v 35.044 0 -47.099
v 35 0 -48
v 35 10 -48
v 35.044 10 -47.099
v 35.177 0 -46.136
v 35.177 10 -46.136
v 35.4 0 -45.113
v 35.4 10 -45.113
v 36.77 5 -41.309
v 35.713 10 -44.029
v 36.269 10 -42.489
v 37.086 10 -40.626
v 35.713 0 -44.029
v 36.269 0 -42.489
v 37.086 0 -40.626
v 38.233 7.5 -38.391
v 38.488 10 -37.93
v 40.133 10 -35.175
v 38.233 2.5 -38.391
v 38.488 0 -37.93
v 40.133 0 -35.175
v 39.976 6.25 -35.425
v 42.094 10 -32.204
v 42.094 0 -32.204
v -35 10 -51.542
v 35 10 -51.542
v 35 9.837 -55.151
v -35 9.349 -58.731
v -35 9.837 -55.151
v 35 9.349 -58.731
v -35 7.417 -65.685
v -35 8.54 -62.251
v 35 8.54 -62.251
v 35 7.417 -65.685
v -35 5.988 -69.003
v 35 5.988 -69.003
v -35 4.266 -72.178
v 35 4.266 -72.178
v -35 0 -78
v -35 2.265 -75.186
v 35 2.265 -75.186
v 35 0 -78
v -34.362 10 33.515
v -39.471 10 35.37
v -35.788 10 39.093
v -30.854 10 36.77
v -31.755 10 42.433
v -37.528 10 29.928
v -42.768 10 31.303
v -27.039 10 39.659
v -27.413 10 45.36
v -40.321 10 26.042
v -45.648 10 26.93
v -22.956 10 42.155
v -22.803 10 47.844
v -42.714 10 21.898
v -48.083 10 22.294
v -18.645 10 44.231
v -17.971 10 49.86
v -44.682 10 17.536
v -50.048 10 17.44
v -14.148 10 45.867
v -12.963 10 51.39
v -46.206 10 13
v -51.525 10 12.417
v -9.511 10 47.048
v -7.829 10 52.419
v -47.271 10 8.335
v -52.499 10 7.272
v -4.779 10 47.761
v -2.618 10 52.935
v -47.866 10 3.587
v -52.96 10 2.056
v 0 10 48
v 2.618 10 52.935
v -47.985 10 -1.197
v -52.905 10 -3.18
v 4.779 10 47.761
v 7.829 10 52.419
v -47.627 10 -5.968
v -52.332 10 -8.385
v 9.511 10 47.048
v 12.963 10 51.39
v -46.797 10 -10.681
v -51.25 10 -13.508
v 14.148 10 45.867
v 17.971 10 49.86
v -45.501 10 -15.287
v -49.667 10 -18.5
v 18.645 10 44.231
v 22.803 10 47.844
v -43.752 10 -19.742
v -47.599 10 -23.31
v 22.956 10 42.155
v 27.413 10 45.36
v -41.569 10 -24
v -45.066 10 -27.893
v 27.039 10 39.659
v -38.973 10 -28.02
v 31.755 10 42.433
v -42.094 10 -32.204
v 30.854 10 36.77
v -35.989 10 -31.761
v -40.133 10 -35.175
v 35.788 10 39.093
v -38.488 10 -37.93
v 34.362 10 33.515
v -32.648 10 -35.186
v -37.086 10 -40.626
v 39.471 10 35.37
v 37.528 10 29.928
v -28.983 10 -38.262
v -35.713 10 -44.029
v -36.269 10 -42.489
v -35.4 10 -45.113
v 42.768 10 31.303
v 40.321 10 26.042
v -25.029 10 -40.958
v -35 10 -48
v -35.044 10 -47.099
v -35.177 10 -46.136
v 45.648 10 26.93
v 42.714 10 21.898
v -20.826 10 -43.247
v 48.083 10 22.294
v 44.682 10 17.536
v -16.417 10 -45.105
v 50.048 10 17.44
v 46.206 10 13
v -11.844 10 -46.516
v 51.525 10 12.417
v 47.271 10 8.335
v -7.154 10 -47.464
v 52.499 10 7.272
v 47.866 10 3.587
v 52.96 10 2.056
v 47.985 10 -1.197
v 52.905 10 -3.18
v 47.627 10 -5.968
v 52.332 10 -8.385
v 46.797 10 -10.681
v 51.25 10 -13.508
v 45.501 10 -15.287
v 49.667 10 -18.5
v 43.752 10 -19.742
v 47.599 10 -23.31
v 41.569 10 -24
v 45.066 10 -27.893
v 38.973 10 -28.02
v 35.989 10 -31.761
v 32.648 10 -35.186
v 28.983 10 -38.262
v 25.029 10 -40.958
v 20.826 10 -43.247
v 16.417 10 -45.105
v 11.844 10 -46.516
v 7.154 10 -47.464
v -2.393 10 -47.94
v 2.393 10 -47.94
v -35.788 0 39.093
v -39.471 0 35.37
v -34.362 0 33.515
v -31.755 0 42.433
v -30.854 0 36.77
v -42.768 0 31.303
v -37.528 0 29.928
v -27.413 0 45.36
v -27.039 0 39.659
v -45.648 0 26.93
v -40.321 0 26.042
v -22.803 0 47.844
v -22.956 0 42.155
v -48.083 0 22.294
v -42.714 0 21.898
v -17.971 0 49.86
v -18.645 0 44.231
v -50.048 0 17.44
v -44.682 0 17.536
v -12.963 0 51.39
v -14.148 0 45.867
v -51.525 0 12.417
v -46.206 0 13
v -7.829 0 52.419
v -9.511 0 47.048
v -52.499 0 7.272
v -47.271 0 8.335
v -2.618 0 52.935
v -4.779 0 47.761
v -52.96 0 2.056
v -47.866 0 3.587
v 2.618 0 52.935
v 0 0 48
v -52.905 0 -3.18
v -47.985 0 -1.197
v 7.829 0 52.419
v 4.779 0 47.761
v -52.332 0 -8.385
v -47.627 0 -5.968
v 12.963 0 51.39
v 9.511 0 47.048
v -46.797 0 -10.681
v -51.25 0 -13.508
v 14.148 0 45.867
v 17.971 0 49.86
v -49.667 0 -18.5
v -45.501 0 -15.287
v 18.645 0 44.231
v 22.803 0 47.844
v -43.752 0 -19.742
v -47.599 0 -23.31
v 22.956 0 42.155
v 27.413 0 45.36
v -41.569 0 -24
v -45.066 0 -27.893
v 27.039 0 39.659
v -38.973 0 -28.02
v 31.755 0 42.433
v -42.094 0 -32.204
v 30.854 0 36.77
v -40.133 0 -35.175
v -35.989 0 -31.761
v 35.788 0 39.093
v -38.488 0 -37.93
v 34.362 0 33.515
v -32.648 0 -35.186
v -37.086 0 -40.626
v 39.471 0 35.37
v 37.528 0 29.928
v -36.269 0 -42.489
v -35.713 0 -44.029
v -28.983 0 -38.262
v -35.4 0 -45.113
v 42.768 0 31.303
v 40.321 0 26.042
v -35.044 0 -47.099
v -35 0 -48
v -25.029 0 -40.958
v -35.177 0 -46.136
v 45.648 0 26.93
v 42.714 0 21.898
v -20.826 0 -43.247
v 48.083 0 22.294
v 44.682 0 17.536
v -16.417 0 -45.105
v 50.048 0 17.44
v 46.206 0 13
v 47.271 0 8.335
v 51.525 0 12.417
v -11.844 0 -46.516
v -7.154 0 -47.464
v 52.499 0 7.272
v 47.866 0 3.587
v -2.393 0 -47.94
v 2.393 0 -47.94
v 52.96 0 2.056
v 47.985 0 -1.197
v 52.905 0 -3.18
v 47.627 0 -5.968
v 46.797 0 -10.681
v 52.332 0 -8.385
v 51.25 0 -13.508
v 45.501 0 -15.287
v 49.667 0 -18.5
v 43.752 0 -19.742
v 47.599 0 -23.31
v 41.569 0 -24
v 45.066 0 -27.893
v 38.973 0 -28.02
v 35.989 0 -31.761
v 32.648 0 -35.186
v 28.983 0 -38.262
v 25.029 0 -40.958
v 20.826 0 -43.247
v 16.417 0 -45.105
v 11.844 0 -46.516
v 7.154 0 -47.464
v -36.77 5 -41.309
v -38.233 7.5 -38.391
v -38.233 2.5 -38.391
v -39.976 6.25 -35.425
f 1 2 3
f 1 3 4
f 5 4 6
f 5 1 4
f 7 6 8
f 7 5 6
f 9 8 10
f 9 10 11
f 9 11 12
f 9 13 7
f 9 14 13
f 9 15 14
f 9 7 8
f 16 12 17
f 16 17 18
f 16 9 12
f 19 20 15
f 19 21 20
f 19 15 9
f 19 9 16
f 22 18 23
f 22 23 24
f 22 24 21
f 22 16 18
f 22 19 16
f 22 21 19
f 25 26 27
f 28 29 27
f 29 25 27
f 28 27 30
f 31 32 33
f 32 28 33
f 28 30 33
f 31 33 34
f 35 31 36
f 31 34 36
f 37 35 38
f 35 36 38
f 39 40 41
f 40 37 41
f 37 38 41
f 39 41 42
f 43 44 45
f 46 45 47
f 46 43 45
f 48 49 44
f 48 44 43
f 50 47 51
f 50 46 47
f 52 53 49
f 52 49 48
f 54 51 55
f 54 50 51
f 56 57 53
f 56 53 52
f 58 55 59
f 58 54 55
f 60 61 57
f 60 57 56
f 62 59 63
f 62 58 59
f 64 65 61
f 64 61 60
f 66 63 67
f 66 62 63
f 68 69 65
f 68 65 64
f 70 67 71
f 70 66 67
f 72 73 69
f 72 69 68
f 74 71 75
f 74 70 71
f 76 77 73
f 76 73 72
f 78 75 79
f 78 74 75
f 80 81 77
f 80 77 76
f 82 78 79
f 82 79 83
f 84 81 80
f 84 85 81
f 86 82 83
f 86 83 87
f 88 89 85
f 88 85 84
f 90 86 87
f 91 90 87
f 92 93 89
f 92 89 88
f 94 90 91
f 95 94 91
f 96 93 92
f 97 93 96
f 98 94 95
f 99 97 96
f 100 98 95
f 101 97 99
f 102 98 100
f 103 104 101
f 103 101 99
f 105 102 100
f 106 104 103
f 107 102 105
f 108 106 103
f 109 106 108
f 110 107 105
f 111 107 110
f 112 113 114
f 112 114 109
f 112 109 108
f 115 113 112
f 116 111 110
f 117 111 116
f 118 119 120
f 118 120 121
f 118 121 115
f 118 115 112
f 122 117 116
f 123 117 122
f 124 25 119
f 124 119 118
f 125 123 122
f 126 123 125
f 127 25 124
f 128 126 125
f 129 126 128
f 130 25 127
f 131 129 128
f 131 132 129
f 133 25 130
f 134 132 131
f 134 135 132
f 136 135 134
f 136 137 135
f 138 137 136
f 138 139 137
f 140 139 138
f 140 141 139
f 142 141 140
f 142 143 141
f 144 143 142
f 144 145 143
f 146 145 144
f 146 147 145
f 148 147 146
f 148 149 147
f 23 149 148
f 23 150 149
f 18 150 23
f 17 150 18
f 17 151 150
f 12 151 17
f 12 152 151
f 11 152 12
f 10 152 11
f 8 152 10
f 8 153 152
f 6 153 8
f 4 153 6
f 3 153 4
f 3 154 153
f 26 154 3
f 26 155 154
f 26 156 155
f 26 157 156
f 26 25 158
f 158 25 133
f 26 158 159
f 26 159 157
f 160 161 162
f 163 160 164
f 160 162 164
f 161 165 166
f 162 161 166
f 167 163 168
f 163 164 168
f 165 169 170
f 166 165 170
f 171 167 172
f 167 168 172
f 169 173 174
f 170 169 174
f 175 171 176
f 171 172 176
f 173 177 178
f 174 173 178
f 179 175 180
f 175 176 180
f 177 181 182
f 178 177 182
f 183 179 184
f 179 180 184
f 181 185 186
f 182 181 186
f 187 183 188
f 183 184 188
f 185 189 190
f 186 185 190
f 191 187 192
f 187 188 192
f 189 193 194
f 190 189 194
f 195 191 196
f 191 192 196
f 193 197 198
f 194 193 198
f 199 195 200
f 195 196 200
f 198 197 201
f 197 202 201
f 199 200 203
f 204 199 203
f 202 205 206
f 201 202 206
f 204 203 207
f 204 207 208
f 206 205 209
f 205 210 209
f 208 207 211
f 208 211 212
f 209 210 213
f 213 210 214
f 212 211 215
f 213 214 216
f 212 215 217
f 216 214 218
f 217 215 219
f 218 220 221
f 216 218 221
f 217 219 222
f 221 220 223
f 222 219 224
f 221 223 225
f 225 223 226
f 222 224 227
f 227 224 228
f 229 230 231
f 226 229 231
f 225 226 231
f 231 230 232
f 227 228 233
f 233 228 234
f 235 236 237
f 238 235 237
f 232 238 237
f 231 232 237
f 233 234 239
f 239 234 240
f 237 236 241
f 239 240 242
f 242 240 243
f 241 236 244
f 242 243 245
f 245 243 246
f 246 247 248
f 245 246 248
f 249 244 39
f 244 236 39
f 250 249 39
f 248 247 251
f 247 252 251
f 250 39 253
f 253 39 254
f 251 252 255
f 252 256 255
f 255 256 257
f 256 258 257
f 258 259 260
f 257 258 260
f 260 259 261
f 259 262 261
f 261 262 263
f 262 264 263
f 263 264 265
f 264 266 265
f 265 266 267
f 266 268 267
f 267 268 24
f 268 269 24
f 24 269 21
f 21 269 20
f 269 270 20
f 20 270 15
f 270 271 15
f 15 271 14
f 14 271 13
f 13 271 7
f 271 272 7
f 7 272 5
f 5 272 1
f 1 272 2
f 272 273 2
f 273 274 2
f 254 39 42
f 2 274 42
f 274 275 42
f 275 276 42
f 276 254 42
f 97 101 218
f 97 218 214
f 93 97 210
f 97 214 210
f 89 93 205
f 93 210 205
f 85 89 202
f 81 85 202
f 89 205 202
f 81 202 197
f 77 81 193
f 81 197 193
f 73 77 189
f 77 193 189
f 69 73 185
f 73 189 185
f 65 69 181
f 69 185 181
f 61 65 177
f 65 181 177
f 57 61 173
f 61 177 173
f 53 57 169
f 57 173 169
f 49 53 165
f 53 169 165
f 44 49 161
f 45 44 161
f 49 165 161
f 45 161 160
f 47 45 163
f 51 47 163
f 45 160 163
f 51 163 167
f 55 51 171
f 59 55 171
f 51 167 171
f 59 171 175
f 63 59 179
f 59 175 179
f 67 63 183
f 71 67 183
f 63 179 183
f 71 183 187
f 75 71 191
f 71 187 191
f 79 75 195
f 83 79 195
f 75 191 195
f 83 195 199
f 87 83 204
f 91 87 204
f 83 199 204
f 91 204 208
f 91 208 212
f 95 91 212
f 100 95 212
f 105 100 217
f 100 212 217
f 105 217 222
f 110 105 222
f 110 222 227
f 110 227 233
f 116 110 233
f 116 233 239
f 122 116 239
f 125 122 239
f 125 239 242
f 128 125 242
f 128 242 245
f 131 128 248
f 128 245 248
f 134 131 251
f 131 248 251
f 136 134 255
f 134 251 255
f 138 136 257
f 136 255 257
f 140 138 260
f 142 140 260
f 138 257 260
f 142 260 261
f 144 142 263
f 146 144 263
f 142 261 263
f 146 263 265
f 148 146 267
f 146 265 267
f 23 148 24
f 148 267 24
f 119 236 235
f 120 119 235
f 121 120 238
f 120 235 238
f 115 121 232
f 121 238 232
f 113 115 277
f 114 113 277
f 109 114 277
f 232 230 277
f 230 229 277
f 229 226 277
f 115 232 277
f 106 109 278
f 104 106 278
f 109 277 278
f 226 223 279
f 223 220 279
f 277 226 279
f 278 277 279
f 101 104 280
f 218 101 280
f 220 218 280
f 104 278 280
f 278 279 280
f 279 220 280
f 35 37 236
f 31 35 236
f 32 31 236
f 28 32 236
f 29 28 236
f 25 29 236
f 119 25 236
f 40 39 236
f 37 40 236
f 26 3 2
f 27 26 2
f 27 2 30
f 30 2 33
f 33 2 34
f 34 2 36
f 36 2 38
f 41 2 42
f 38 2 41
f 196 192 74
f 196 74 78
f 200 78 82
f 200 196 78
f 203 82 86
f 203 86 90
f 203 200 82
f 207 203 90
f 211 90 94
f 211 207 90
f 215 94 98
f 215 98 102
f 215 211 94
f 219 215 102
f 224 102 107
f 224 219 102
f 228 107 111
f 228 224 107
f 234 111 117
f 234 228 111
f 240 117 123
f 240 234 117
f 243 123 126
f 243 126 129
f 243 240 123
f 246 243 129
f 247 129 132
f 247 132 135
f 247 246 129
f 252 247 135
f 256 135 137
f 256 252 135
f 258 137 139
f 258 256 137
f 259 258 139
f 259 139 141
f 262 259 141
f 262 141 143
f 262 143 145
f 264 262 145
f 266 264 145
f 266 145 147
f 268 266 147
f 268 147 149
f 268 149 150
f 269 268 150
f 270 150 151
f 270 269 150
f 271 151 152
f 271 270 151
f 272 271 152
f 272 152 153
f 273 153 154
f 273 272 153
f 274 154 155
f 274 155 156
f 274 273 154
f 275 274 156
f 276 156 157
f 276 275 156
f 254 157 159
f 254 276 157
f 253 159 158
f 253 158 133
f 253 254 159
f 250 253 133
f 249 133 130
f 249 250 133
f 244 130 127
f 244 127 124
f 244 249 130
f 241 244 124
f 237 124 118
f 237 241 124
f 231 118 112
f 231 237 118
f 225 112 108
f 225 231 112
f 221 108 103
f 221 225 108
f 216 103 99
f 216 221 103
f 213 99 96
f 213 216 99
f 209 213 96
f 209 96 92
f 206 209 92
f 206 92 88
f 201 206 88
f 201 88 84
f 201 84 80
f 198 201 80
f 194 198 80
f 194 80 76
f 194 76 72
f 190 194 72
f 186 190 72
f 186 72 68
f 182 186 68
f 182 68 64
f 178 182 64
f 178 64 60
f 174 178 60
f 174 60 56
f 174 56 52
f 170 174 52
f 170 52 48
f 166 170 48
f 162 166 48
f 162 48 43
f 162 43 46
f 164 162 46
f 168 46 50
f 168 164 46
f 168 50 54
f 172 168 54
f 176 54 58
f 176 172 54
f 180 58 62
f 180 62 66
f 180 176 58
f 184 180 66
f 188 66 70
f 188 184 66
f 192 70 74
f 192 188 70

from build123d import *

# Parameters (mm, degrees)
SKETCH1_R           = 48
BOSS_EXTRUDE1_DEPTH = 10
FILLET1_R           = 40


with BuildPart() as part:
    # Sketch1 → Boss-Extrude1 (new body)
    with BuildSketch(Plane(origin=(0, 0, 0), x_dir=(1, 0, 0), z_dir=(0, 1, 0))):
        with BuildLine():
            Line((35, 78), (-35, 78))
            Line((-35, 78), (-35, 48))
            add(Edge.make_bspline(
                [(-35, 48), (-34.99357519, 42.516288621), (-42.093715926, 32.204333242)],
                knots=[0, 0, 0, 1, 1, 1], degree=2))
            ThreePointArc((-42.093715926, 32.204333242), (0, -53), (42.093715926, 32.204333242))
            add(Edge.make_bspline(
                [(35, 48), (34.99357519, 42.516288621), (42.093715926, 32.204333242)],
                knots=[0, 0, 0, 1, 1, 1], degree=2))
            Line((35, 48), (35, 78))
        make_face()
        with Locations(Location((0, 0, 0), (0, 0, 270))):
            Circle(SKETCH1_R, mode=Mode.SUBTRACT)
    extrude(amount=BOSS_EXTRUDE1_DEPTH)

    # Fillet1
    # the kernel refuses this fillet: 40 mm, written as the material it takes off along each edge
    with BuildSketch(Plane(origin=(101.143782777, 10, -78), x_dir=(0, -1, 0), z_dir=(-1, 0, 0))) as fillet1_piece_1:
        with BuildLine():
            CenterArc((40, 26.457513111), FILLET1_R, 180, 41.409622109)
            Line((0, 26.457513111), (-0.8, 26.457513111))
            Line((-0.8, 26.457513111), (-0.8, 0))
            Line((-0.8, 0), (0, -0.8))
            ThreePointArc((0, -0.8), (5, -0.8), (9.4, -0.529150262))
            Line((9.4, -0.529150262), (10, 0))
        make_face()
    extrude(amount=202.287565553, mode=Mode.SUBTRACT)


solid = part.part
